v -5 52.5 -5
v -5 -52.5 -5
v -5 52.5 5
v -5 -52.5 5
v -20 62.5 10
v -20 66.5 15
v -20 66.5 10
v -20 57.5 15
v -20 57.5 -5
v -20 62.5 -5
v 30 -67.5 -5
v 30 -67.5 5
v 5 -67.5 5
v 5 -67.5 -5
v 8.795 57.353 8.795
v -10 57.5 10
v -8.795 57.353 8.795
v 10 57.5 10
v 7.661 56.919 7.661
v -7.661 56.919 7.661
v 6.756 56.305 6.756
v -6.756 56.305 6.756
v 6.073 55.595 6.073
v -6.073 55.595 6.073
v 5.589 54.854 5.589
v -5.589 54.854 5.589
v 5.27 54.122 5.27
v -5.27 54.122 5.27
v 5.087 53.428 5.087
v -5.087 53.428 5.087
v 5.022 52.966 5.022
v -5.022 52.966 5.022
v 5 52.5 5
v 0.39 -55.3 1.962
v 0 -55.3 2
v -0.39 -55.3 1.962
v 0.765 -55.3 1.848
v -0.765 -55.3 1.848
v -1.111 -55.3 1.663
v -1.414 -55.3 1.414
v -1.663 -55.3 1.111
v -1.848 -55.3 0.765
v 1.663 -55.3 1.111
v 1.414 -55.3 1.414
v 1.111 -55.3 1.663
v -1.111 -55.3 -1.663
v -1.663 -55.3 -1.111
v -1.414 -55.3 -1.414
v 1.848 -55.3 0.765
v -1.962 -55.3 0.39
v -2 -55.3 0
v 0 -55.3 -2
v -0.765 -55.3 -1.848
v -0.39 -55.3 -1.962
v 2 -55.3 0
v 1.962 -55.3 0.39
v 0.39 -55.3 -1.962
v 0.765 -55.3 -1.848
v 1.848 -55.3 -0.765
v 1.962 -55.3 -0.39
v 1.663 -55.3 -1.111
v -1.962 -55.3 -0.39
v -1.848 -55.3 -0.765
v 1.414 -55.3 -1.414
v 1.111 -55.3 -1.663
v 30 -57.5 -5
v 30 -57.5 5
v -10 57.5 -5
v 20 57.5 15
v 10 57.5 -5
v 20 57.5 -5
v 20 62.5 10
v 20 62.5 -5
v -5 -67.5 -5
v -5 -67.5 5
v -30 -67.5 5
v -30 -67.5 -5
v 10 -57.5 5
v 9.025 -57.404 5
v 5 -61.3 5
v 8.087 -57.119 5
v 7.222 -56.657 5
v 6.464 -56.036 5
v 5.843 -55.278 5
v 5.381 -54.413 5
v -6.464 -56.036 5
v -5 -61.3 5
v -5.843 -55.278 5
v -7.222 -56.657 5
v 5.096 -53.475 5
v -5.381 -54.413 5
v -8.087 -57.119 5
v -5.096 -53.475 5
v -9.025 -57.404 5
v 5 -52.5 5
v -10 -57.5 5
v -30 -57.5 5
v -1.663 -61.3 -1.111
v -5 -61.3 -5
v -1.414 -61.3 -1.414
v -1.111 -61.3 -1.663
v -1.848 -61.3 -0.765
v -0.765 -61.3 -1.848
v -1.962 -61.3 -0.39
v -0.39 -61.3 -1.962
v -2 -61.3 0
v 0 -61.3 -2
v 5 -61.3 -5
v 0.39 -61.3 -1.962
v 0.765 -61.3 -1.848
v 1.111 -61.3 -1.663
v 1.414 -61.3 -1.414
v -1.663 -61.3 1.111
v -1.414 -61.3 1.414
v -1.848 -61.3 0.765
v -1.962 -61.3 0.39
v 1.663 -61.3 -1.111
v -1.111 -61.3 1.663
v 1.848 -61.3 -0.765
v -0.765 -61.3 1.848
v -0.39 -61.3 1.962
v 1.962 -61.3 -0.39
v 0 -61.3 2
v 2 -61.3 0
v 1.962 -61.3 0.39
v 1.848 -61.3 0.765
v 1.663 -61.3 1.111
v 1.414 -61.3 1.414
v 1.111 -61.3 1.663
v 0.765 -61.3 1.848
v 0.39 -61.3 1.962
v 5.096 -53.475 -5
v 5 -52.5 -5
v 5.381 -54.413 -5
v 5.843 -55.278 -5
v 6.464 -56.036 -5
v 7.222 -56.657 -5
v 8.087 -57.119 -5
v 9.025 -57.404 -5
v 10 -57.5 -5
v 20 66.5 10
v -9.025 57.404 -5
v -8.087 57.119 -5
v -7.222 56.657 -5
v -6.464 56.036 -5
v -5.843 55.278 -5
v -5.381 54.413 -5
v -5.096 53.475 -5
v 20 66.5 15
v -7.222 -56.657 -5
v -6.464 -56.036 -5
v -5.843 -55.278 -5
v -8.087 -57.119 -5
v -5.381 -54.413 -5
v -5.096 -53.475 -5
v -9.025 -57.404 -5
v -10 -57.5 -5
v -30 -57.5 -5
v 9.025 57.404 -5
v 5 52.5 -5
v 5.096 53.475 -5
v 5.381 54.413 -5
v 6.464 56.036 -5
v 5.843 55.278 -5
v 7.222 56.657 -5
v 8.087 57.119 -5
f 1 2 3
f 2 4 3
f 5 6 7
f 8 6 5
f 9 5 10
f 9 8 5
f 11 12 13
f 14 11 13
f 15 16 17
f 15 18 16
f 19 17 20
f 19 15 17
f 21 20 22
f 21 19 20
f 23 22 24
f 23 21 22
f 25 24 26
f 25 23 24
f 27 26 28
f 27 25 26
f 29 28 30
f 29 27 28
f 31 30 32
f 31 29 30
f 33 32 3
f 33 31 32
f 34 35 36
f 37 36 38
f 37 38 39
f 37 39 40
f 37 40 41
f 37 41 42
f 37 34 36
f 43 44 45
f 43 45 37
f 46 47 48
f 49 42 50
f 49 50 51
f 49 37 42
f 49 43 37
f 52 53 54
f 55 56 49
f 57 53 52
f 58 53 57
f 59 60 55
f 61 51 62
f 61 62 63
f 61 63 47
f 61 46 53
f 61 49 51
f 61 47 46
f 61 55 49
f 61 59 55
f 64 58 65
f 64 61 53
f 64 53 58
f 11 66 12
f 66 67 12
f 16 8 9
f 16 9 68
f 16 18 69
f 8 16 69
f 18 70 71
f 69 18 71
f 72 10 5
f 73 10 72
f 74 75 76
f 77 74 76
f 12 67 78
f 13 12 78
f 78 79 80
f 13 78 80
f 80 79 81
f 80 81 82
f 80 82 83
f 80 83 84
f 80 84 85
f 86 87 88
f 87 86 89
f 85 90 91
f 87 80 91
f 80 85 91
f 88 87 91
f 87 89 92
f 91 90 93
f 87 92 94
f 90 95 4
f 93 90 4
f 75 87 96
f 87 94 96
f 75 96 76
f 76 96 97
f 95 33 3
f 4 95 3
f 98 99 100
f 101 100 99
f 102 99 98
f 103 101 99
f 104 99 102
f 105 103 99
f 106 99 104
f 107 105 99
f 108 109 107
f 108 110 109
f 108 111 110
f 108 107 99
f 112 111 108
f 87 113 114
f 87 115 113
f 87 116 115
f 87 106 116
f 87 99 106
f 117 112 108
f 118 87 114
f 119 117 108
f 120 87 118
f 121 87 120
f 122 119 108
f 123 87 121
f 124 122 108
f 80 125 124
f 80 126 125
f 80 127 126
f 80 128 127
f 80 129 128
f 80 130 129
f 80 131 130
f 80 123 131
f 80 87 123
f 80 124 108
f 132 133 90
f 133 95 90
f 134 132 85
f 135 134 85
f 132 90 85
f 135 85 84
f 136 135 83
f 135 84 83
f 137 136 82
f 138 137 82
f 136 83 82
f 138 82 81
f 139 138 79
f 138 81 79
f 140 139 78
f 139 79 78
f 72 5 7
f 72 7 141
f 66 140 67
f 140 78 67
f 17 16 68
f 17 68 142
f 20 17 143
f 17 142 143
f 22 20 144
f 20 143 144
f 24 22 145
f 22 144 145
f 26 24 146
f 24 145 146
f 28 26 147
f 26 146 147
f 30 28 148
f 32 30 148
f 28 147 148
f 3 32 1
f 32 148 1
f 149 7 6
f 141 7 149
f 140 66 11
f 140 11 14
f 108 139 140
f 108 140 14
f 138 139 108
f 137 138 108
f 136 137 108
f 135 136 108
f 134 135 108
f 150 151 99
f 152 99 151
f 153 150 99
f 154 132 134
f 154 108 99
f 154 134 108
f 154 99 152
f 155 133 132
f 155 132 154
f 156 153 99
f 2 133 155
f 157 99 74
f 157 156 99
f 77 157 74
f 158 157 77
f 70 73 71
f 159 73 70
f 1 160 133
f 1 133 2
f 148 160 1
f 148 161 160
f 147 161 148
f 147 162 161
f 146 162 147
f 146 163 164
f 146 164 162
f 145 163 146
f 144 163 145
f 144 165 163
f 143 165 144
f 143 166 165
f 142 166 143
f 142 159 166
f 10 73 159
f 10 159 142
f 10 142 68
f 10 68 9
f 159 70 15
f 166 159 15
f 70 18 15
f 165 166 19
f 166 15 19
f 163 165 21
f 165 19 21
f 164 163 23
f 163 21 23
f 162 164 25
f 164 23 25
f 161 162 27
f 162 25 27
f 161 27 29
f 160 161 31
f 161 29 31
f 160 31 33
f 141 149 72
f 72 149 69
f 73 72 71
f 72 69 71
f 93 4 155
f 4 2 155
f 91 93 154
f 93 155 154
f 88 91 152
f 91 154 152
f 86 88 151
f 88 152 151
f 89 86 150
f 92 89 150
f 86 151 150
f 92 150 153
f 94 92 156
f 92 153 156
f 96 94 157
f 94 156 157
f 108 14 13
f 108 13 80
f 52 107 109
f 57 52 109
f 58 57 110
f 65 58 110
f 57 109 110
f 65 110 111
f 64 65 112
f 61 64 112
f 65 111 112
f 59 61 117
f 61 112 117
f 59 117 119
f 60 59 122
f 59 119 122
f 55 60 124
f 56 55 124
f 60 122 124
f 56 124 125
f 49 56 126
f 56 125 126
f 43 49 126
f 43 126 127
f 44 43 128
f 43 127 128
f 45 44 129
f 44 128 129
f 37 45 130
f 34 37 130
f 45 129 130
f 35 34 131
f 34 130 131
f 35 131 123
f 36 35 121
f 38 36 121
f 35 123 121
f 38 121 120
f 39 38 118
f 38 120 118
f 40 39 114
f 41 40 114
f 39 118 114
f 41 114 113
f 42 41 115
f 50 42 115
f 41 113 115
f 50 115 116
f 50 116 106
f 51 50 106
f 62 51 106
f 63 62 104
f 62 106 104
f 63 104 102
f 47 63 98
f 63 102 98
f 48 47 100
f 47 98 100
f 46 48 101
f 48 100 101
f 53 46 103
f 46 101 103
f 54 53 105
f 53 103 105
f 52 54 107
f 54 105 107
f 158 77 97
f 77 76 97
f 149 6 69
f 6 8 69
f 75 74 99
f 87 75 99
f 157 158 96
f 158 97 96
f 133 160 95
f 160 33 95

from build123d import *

# Parameters (mm, degrees)
BOSS_EXTRUDE1_DEPTH = 5
SKETCH3_W           = 40
SKETCH3_H           = 10
BOSS_EXTRUDE2_DEPTH = 5
SKETCH4_W           = 40
SKETCH4_H           = 5
BOSS_EXTRUDE3_DEPTH = 4
SKETCH7_W           = 10
SKETCH7_H           = 6.2
CUT_EXTRUDE1_DEPTH  = 75.540257579
SKETCH8_R           = 2
CUT_EXTRUDE2_DEPTH  = 6
FILLET3_R           = 5


with BuildPart() as part:
    # Sketch1 → Boss-Extrude1 (new, symmetric)
    with BuildSketch(Plane.XY):
        Polygon((5, -57.5), (30, -57.5), (30, -67.5), (-30, -67.5), (-30, -57.5), (-5, -57.5), (-5, 57.5), (-20, 57.5), (-20, 62.5), (20, 62.5), (20, 57.5), (5, 57.5), align=None)
    extrude(amount=BOSS_EXTRUDE1_DEPTH, both=True)

    # Sketch3 → Boss-Extrude2 (add)
    with BuildSketch(Plane(origin=(0, 62.5, 0), x_dir=(1, 0, 0), z_dir=(0, 1, 0))):
        with Locations((0, -10)):
            Rectangle(SKETCH3_W, SKETCH3_H)
    extrude(amount=-BOSS_EXTRUDE2_DEPTH)

    # Sketch4 → Boss-Extrude3 (add)
    with BuildSketch(Plane(origin=(0, 62.5, 0), x_dir=(1, 0, 0), z_dir=(0, 1, 0))):
        with Locations((0, -12.5)):
            Rectangle(SKETCH4_W, SKETCH4_H)
    extrude(amount=BOSS_EXTRUDE3_DEPTH)

    # Sketch7 → Cut-Extrude1 (cut, through all)
    with BuildSketch(Plane.XY.offset(5)):
        with Locations((0, -64.4)):
            Rectangle(SKETCH7_W, SKETCH7_H)
    extrude(amount=-CUT_EXTRUDE1_DEPTH, mode=Mode.SUBTRACT)

    # Sketch8 → Cut-Extrude2 (cut)
    with BuildSketch(Plane.XZ.offset(61.3)):
        with Locations(Location((0, 0, 0), (0, 0, 270))):
            Circle(SKETCH8_R)
    extrude(amount=-CUT_EXTRUDE2_DEPTH, mode=Mode.SUBTRACT)

    # Fillet3
    fillet3_edges = [part.edges().sort_by_distance(p)[0] for p in [
        (5, -57.5, 0),
        (-5, -57.5, 0),
        (-5, 57.5, 0),
        (5, 57.5, 0),
        (0, 57.5, 5),
    ]]
    fillet(fillet3_edges, radius=FILLET3_R)


solid = part.part
